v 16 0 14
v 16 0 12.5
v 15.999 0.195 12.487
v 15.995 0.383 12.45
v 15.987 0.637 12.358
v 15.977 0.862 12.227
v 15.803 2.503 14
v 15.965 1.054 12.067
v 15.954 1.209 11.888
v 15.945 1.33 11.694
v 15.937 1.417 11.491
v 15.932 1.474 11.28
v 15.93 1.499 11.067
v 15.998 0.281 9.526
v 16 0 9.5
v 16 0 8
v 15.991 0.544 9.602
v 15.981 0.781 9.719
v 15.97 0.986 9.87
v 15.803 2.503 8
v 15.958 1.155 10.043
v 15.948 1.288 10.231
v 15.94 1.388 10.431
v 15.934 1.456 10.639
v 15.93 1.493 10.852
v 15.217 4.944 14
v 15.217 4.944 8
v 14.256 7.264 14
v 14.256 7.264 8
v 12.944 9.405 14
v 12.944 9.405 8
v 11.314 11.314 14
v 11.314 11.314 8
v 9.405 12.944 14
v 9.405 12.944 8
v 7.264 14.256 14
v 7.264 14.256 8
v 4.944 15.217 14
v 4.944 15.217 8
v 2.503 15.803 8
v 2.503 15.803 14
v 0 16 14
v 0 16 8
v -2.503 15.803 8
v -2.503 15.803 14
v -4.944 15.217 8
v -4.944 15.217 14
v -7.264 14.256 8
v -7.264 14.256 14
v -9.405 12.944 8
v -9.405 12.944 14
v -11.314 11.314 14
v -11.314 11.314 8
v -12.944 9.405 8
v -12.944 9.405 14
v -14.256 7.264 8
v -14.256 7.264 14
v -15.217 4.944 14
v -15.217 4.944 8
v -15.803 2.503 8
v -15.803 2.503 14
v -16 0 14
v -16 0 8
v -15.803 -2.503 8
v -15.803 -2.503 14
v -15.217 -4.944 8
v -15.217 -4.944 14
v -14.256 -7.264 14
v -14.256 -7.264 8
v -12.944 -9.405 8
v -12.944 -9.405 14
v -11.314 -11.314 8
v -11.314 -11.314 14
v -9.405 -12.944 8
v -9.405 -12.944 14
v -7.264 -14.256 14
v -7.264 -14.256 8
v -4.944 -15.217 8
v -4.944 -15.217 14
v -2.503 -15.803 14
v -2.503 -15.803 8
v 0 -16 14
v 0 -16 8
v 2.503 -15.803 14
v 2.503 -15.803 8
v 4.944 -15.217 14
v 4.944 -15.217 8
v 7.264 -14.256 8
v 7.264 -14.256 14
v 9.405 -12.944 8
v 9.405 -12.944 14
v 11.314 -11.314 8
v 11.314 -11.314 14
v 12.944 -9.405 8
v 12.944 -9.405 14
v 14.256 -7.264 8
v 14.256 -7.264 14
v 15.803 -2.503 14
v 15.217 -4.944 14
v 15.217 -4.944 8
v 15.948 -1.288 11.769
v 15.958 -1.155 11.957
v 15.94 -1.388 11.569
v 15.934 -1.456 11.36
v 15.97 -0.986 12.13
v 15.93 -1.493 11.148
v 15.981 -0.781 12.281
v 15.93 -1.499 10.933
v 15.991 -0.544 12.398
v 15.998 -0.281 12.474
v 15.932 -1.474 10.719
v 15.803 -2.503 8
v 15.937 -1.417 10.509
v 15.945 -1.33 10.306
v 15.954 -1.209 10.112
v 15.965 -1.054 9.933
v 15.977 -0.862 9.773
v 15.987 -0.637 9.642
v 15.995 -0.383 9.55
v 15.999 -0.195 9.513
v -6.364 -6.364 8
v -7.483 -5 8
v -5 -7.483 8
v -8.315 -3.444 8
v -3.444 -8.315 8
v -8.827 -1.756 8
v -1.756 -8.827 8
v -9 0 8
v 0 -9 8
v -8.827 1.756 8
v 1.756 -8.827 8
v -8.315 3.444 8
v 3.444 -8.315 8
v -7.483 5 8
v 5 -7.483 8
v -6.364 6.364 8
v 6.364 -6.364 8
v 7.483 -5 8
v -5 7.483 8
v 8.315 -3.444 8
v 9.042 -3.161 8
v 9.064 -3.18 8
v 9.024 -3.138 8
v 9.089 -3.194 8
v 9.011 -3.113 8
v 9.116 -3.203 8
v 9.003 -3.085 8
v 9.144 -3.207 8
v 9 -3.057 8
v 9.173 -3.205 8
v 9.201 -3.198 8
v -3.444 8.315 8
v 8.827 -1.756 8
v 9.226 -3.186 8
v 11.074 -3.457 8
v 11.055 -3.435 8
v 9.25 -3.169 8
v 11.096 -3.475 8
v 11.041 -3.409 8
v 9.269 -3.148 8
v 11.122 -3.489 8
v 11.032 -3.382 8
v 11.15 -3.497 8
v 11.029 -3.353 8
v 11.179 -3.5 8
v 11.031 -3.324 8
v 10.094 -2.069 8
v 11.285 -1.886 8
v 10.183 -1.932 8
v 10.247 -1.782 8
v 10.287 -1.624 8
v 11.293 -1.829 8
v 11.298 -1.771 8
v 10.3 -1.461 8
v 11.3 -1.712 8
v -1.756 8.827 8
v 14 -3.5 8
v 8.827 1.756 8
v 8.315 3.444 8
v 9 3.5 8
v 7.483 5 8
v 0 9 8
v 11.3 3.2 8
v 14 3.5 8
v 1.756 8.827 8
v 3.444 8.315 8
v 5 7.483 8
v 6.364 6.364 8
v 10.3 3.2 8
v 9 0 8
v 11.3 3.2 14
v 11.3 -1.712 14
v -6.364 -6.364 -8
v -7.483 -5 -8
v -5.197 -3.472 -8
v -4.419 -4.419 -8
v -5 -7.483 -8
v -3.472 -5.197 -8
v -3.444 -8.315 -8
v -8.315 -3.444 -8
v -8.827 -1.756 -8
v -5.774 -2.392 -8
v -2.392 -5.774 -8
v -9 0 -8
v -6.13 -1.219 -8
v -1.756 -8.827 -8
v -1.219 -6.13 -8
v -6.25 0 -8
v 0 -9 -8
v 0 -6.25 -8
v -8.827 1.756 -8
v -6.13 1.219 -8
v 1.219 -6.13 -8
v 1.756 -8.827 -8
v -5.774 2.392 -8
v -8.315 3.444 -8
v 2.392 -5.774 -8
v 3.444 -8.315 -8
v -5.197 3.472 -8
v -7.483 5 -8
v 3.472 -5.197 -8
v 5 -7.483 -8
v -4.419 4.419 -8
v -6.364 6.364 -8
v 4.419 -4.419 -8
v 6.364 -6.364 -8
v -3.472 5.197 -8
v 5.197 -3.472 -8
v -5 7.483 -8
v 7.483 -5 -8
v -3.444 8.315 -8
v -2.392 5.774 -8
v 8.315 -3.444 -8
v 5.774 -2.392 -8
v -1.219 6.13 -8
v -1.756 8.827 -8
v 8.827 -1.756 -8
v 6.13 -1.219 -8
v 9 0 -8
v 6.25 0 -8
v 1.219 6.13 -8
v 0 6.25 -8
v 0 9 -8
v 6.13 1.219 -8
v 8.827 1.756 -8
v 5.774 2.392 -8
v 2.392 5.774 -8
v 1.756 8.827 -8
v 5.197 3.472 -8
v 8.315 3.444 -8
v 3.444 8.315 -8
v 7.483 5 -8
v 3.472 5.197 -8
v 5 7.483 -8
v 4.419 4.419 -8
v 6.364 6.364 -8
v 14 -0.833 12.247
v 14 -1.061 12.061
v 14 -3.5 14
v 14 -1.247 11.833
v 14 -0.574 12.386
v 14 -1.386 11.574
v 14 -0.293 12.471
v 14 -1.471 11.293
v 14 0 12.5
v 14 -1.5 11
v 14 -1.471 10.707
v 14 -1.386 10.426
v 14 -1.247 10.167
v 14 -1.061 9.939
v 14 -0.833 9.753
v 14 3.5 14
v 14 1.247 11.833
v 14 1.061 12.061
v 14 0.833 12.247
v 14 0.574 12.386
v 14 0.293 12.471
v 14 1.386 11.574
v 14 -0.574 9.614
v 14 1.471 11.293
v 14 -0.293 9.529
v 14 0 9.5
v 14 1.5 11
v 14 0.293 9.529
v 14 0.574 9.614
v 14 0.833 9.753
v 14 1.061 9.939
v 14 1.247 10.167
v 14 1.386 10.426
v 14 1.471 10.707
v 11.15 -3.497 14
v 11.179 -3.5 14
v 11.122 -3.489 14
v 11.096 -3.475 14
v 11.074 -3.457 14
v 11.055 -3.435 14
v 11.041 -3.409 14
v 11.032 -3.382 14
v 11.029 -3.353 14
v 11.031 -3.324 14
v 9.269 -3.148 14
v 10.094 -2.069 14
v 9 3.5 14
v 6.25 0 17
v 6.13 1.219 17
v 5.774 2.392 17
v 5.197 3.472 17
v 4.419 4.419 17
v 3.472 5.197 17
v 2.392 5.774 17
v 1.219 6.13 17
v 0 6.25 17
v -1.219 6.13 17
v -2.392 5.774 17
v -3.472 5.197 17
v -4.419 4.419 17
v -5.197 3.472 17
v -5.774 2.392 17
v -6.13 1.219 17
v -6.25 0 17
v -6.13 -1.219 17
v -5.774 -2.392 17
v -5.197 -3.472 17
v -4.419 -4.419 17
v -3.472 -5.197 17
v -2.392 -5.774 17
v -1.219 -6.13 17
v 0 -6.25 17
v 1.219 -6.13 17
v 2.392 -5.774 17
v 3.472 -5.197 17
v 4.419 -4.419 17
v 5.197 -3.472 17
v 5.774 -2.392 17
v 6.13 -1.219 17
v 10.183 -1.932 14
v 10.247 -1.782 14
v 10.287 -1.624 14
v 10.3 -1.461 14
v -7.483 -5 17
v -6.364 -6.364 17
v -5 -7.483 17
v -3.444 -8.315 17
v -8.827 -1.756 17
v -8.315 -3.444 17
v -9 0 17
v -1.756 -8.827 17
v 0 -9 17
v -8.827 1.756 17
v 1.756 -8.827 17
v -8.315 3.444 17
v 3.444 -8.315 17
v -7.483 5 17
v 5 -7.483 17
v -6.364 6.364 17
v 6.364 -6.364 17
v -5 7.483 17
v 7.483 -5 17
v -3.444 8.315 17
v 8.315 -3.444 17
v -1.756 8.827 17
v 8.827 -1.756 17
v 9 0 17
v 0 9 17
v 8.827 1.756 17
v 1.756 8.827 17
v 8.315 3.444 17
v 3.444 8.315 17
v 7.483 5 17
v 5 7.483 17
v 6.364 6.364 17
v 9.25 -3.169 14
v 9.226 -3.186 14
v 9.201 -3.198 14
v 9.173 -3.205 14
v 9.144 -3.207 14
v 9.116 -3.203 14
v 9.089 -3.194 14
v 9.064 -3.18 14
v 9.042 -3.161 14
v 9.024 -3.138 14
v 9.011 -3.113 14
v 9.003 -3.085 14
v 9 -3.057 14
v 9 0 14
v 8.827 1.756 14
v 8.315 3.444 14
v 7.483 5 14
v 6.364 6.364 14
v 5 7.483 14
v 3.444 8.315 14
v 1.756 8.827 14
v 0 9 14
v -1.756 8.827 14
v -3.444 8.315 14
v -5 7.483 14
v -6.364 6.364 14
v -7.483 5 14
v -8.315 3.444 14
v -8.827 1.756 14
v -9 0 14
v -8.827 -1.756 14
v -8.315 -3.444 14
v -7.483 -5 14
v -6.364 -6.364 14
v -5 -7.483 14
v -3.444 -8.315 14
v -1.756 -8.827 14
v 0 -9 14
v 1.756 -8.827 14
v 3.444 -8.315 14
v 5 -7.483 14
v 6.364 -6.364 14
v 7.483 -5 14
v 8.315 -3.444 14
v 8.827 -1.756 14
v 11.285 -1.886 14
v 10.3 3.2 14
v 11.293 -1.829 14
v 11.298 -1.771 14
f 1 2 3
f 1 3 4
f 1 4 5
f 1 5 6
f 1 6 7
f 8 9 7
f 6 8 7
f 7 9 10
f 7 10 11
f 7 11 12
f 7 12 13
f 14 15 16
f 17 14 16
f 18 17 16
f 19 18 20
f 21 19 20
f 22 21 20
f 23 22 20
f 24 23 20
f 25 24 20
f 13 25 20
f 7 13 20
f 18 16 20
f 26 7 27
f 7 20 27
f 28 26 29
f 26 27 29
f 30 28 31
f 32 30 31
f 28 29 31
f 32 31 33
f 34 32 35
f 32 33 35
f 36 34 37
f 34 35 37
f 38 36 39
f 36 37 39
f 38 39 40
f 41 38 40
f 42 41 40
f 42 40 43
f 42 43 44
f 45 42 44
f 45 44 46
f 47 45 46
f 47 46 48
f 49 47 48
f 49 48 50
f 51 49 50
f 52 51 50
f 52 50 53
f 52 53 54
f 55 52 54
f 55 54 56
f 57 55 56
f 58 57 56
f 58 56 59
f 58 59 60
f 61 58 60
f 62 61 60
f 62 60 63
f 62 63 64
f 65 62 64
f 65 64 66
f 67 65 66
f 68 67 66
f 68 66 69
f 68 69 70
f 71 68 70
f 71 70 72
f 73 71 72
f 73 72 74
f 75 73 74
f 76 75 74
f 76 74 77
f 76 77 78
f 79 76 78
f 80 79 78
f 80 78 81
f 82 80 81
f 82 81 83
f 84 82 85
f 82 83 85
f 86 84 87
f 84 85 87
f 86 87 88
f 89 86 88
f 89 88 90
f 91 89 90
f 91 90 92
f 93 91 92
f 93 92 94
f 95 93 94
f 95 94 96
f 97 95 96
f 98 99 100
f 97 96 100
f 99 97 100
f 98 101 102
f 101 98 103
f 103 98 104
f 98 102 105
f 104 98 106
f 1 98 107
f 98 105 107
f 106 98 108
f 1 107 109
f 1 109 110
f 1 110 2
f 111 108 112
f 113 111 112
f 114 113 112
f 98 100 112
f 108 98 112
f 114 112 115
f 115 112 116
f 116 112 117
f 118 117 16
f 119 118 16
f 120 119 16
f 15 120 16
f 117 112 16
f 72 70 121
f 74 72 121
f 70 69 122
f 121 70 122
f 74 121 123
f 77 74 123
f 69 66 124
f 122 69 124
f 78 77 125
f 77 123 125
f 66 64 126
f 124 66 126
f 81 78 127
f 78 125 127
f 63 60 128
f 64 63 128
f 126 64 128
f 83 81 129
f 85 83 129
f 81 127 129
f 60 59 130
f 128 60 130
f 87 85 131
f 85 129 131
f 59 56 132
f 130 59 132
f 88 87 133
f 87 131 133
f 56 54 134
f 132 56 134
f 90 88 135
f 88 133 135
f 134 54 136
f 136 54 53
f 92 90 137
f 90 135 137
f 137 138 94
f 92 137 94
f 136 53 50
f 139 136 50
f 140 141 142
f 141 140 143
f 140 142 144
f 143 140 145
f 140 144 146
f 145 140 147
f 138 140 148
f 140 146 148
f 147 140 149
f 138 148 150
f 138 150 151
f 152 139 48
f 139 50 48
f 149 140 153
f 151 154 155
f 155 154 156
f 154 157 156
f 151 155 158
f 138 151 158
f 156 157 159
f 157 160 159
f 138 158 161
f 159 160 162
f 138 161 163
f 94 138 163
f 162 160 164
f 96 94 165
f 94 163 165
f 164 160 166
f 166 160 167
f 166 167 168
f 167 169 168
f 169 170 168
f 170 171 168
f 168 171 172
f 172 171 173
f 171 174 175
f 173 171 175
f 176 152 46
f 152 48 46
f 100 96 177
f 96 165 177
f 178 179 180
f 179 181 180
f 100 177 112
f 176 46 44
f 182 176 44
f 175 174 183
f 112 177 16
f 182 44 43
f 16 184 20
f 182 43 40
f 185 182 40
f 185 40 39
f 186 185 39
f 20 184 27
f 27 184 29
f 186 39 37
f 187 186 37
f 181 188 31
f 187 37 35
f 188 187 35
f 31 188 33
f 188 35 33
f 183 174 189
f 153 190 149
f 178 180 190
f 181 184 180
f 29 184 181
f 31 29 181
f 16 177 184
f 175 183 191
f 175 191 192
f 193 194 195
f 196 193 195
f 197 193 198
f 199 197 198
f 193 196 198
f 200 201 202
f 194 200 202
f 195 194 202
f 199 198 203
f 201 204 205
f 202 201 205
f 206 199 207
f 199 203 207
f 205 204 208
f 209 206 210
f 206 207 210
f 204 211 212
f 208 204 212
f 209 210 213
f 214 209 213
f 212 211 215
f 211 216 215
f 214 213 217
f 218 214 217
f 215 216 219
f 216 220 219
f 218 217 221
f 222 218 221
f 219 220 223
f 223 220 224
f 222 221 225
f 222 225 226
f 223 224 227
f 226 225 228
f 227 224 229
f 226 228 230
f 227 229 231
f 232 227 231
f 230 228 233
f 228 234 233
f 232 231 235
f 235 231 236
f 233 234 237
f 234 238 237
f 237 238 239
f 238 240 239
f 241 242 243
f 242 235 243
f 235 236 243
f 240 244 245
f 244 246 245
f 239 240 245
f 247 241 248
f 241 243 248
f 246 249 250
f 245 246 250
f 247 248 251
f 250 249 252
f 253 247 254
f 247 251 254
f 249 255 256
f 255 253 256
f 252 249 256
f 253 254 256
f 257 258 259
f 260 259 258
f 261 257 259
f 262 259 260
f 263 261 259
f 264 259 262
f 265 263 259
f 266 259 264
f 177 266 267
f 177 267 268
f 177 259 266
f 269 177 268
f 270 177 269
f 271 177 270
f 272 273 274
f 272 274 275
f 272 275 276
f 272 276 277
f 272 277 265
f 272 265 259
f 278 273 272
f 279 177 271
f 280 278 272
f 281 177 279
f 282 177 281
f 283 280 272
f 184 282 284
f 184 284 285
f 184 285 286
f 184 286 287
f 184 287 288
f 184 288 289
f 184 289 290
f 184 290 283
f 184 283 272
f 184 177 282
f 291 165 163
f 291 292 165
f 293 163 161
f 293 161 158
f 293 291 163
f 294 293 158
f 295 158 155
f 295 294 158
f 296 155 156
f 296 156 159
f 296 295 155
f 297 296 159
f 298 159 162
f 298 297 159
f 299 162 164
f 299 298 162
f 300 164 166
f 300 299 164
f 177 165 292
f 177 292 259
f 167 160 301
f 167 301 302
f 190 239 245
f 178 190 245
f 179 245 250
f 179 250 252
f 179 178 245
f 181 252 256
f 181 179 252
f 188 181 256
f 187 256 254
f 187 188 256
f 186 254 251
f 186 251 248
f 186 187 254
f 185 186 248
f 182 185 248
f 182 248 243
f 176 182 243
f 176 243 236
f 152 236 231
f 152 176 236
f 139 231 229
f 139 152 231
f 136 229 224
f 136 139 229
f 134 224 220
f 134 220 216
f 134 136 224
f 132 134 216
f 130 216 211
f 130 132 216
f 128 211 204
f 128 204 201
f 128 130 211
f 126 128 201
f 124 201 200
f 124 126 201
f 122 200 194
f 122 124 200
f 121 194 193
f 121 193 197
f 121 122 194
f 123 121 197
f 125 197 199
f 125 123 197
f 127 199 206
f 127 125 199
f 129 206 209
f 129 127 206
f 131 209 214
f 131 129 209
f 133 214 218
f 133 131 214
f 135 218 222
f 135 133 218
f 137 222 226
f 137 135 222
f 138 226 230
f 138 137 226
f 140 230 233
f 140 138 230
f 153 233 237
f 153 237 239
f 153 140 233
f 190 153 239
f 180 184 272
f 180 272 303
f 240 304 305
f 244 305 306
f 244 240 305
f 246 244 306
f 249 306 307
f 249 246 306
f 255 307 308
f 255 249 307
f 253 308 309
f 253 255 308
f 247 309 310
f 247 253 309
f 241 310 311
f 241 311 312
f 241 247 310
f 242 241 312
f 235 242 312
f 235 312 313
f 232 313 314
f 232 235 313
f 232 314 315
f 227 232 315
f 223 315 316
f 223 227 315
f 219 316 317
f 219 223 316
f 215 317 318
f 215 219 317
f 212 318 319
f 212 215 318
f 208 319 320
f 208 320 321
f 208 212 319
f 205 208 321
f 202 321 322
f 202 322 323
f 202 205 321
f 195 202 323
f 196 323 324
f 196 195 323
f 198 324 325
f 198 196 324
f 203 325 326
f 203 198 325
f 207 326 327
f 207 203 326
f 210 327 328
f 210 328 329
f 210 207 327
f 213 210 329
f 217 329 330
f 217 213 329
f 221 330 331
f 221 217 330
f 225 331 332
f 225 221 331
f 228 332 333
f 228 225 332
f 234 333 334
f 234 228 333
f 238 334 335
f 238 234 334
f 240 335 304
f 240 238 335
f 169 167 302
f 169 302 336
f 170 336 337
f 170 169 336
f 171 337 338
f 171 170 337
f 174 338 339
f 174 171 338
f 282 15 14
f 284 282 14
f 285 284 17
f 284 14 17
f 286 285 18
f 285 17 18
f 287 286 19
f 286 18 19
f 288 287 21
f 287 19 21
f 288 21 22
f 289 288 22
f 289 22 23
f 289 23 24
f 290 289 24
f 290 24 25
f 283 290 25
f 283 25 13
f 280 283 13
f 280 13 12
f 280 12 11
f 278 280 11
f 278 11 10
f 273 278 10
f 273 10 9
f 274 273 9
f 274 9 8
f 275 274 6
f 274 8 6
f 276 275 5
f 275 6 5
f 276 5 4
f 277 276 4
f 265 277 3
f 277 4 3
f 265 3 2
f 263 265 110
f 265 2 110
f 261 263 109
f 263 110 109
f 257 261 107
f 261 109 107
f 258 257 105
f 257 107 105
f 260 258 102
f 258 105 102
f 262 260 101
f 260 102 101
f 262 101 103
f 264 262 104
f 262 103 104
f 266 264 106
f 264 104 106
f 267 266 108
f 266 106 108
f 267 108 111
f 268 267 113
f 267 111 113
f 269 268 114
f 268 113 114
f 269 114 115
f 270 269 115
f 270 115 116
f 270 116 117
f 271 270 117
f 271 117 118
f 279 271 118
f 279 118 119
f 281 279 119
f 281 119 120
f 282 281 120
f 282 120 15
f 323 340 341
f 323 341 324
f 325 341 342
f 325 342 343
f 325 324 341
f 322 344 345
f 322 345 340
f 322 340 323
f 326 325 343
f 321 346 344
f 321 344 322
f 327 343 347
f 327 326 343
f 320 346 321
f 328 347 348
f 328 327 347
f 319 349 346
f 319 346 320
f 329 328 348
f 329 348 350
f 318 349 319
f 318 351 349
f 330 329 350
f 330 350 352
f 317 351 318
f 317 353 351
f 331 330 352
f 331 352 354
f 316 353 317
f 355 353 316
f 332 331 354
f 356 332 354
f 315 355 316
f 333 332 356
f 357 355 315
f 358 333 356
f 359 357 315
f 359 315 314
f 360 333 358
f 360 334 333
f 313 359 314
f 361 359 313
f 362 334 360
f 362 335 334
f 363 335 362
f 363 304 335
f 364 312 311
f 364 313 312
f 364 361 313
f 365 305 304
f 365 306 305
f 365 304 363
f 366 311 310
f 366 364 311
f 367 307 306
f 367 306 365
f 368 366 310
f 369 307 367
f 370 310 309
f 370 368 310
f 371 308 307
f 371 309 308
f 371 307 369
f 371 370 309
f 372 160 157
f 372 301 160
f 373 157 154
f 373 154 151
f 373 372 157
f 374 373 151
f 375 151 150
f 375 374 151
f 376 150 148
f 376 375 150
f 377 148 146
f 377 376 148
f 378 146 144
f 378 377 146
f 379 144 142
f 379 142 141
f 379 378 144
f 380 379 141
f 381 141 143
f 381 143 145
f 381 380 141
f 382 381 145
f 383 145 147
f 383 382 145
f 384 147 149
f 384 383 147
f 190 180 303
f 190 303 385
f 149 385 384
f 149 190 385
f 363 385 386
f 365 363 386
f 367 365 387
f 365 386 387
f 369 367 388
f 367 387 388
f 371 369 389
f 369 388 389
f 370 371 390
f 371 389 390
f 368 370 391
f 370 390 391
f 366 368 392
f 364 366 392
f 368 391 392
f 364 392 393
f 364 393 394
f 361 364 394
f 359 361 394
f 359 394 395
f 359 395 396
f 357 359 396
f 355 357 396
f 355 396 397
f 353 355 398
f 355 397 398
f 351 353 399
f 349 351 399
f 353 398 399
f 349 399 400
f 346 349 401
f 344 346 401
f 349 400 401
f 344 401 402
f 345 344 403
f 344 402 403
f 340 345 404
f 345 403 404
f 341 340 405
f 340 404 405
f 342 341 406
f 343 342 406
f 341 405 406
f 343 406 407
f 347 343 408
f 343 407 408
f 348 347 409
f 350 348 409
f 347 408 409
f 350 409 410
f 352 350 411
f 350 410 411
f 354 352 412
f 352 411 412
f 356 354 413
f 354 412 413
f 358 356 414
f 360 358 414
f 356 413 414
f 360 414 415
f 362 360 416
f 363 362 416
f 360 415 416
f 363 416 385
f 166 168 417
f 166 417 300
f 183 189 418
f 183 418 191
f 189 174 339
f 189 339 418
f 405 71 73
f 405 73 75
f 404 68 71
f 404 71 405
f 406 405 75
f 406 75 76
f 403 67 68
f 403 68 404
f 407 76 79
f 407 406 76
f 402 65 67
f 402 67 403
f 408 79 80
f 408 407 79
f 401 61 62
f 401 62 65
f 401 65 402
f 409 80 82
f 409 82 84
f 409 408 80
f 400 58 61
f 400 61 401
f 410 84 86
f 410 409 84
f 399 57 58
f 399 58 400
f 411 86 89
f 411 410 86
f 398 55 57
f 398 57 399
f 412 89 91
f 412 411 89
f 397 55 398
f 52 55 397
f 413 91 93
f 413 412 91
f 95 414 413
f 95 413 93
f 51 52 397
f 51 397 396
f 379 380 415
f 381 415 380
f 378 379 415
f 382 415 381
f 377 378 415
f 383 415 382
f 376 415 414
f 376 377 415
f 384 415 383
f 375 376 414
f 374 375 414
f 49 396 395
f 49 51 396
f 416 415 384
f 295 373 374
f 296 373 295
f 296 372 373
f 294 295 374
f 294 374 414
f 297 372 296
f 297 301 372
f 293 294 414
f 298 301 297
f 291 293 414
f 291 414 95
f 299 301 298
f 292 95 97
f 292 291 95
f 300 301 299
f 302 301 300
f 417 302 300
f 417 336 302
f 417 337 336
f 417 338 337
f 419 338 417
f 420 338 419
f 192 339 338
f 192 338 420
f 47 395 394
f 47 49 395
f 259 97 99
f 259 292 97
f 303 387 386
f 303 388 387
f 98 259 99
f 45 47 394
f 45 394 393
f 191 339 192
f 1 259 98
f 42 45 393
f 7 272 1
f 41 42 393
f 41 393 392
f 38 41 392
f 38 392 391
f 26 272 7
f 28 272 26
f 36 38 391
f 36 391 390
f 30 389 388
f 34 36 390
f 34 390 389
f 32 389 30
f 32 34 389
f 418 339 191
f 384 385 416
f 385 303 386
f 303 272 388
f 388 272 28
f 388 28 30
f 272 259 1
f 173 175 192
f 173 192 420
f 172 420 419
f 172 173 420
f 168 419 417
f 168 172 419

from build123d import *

# Parameters (mm, degrees)
SKIZZE1_R                       = 9
SKIZZE1_R_2                     = 6.25
AUFSATZ_LINEAR_AUSTRAGEN1_DEPTH = 8
SKIZZE2_R                       = 16
SKIZZE2_R_2                     = 6.25
AUFSATZ_LINEAR_AUSTRAGEN2_DEPTH = 6
SCHNITT_LINEAR_AUSTRAGEN1_DEPTH = 6
SCHNITT_LINEAR_START            = 17
SKIZZE4_R                       = 1.5
SCHNITT_LINEAR_AUSTRAGEN2_DEPTH = 4
SKIZZE5_R                       = 9
SKIZZE5_R_2                     = 6.25
AUFSATZ_LINEAR_AUSTRAGEN3_DEPTH = 3
VERRUNDUNG1_R                   = 0.15
VERRUNDUNG2_R                   = 0.15


with BuildPart() as part:
    # Skizze1 → Aufsatz-Linear austragen1 (new, symmetric)
    with BuildSketch(Plane.XY):
        Circle(SKIZZE1_R)
        Circle(SKIZZE1_R_2, mode=Mode.SUBTRACT)
    extrude(amount=AUFSATZ_LINEAR_AUSTRAGEN1_DEPTH, both=True)

    # Skizze2 → Aufsatz-Linear austragen2 (add)
    with BuildSketch(Plane.XY.offset(8)):
        Circle(SKIZZE2_R)
        Circle(SKIZZE2_R_2, mode=Mode.SUBTRACT)
    extrude(amount=AUFSATZ_LINEAR_AUSTRAGEN2_DEPTH)

    # Skizze3 → Schnitt-Linear austragen1 (cut)
    with BuildSketch(Plane(origin=(0, 0, 8), x_dir=(-1, 0, 0), z_dir=(0, 0, -1))):
        with BuildLine():
            Line((-9, -3.5), (-10.094357833, -2.06891668))
            ThreePointArc((-10.094357833, -2.06891668), (-10.24719529, -1.78212384), (-10.3, -1.461466572))
            Line((-10.3, -1.461466572), (-10.3, 3.2))
            Line((-10.3, 3.2), (-11.3, 3.2))
            Line((-11.3, 3.2), (-11.3, -1.712441166))
            ThreePointArc((-11.3, -1.712441166), (-11.296188626, -1.799666281), (-11.284783559, -1.8862265))
            Line((-11.284783559, -1.8862265), (-11, -3.5))
            Line((-11, -3.5), (-14, -3.5))
            Line((-14, -3.5), (-14, 3.5))
            Line((-14, 3.5), (-9, 3.5))
            Line((-9, 3.5), (-9, -3.5))
        make_face()
    extrude(amount=-SCHNITT_LINEAR_AUSTRAGEN1_DEPTH, mode=Mode.SUBTRACT)

    # Skizze4 → Schnitt-Linear austragen2 (cut)
    with BuildSketch(Plane(origin=(0, 0, 0), x_dir=(0, 0, -1), z_dir=(1, 0, 0)).offset(SCHNITT_LINEAR_START)):
        with Locations((-11, 0)):
            Circle(SKIZZE4_R)
    extrude(amount=-SCHNITT_LINEAR_AUSTRAGEN2_DEPTH, mode=Mode.SUBTRACT)

    # Skizze5 → Aufsatz-Linear austragen3 (add)
    with BuildSketch(Plane.XY.offset(14)):
        Circle(SKIZZE5_R)
        Circle(SKIZZE5_R_2, mode=Mode.SUBTRACT)
    extrude(amount=AUFSATZ_LINEAR_AUSTRAGEN3_DEPTH)

    # Verrundung1
    verrundung1_edges = [part.edges().sort_by_distance(p)[0] for p in [
        (9, -3.5, 11),
    ]]
    fillet(verrundung1_edges, radius=VERRUNDUNG1_R)

    # Verrundung2
    verrundung2_edges = [part.edges().sort_by_distance(p)[0] for p in [
        (11, -3.5, 11),
    ]]
    fillet(verrundung2_edges, radius=VERRUNDUNG2_R)


solid = part.part
